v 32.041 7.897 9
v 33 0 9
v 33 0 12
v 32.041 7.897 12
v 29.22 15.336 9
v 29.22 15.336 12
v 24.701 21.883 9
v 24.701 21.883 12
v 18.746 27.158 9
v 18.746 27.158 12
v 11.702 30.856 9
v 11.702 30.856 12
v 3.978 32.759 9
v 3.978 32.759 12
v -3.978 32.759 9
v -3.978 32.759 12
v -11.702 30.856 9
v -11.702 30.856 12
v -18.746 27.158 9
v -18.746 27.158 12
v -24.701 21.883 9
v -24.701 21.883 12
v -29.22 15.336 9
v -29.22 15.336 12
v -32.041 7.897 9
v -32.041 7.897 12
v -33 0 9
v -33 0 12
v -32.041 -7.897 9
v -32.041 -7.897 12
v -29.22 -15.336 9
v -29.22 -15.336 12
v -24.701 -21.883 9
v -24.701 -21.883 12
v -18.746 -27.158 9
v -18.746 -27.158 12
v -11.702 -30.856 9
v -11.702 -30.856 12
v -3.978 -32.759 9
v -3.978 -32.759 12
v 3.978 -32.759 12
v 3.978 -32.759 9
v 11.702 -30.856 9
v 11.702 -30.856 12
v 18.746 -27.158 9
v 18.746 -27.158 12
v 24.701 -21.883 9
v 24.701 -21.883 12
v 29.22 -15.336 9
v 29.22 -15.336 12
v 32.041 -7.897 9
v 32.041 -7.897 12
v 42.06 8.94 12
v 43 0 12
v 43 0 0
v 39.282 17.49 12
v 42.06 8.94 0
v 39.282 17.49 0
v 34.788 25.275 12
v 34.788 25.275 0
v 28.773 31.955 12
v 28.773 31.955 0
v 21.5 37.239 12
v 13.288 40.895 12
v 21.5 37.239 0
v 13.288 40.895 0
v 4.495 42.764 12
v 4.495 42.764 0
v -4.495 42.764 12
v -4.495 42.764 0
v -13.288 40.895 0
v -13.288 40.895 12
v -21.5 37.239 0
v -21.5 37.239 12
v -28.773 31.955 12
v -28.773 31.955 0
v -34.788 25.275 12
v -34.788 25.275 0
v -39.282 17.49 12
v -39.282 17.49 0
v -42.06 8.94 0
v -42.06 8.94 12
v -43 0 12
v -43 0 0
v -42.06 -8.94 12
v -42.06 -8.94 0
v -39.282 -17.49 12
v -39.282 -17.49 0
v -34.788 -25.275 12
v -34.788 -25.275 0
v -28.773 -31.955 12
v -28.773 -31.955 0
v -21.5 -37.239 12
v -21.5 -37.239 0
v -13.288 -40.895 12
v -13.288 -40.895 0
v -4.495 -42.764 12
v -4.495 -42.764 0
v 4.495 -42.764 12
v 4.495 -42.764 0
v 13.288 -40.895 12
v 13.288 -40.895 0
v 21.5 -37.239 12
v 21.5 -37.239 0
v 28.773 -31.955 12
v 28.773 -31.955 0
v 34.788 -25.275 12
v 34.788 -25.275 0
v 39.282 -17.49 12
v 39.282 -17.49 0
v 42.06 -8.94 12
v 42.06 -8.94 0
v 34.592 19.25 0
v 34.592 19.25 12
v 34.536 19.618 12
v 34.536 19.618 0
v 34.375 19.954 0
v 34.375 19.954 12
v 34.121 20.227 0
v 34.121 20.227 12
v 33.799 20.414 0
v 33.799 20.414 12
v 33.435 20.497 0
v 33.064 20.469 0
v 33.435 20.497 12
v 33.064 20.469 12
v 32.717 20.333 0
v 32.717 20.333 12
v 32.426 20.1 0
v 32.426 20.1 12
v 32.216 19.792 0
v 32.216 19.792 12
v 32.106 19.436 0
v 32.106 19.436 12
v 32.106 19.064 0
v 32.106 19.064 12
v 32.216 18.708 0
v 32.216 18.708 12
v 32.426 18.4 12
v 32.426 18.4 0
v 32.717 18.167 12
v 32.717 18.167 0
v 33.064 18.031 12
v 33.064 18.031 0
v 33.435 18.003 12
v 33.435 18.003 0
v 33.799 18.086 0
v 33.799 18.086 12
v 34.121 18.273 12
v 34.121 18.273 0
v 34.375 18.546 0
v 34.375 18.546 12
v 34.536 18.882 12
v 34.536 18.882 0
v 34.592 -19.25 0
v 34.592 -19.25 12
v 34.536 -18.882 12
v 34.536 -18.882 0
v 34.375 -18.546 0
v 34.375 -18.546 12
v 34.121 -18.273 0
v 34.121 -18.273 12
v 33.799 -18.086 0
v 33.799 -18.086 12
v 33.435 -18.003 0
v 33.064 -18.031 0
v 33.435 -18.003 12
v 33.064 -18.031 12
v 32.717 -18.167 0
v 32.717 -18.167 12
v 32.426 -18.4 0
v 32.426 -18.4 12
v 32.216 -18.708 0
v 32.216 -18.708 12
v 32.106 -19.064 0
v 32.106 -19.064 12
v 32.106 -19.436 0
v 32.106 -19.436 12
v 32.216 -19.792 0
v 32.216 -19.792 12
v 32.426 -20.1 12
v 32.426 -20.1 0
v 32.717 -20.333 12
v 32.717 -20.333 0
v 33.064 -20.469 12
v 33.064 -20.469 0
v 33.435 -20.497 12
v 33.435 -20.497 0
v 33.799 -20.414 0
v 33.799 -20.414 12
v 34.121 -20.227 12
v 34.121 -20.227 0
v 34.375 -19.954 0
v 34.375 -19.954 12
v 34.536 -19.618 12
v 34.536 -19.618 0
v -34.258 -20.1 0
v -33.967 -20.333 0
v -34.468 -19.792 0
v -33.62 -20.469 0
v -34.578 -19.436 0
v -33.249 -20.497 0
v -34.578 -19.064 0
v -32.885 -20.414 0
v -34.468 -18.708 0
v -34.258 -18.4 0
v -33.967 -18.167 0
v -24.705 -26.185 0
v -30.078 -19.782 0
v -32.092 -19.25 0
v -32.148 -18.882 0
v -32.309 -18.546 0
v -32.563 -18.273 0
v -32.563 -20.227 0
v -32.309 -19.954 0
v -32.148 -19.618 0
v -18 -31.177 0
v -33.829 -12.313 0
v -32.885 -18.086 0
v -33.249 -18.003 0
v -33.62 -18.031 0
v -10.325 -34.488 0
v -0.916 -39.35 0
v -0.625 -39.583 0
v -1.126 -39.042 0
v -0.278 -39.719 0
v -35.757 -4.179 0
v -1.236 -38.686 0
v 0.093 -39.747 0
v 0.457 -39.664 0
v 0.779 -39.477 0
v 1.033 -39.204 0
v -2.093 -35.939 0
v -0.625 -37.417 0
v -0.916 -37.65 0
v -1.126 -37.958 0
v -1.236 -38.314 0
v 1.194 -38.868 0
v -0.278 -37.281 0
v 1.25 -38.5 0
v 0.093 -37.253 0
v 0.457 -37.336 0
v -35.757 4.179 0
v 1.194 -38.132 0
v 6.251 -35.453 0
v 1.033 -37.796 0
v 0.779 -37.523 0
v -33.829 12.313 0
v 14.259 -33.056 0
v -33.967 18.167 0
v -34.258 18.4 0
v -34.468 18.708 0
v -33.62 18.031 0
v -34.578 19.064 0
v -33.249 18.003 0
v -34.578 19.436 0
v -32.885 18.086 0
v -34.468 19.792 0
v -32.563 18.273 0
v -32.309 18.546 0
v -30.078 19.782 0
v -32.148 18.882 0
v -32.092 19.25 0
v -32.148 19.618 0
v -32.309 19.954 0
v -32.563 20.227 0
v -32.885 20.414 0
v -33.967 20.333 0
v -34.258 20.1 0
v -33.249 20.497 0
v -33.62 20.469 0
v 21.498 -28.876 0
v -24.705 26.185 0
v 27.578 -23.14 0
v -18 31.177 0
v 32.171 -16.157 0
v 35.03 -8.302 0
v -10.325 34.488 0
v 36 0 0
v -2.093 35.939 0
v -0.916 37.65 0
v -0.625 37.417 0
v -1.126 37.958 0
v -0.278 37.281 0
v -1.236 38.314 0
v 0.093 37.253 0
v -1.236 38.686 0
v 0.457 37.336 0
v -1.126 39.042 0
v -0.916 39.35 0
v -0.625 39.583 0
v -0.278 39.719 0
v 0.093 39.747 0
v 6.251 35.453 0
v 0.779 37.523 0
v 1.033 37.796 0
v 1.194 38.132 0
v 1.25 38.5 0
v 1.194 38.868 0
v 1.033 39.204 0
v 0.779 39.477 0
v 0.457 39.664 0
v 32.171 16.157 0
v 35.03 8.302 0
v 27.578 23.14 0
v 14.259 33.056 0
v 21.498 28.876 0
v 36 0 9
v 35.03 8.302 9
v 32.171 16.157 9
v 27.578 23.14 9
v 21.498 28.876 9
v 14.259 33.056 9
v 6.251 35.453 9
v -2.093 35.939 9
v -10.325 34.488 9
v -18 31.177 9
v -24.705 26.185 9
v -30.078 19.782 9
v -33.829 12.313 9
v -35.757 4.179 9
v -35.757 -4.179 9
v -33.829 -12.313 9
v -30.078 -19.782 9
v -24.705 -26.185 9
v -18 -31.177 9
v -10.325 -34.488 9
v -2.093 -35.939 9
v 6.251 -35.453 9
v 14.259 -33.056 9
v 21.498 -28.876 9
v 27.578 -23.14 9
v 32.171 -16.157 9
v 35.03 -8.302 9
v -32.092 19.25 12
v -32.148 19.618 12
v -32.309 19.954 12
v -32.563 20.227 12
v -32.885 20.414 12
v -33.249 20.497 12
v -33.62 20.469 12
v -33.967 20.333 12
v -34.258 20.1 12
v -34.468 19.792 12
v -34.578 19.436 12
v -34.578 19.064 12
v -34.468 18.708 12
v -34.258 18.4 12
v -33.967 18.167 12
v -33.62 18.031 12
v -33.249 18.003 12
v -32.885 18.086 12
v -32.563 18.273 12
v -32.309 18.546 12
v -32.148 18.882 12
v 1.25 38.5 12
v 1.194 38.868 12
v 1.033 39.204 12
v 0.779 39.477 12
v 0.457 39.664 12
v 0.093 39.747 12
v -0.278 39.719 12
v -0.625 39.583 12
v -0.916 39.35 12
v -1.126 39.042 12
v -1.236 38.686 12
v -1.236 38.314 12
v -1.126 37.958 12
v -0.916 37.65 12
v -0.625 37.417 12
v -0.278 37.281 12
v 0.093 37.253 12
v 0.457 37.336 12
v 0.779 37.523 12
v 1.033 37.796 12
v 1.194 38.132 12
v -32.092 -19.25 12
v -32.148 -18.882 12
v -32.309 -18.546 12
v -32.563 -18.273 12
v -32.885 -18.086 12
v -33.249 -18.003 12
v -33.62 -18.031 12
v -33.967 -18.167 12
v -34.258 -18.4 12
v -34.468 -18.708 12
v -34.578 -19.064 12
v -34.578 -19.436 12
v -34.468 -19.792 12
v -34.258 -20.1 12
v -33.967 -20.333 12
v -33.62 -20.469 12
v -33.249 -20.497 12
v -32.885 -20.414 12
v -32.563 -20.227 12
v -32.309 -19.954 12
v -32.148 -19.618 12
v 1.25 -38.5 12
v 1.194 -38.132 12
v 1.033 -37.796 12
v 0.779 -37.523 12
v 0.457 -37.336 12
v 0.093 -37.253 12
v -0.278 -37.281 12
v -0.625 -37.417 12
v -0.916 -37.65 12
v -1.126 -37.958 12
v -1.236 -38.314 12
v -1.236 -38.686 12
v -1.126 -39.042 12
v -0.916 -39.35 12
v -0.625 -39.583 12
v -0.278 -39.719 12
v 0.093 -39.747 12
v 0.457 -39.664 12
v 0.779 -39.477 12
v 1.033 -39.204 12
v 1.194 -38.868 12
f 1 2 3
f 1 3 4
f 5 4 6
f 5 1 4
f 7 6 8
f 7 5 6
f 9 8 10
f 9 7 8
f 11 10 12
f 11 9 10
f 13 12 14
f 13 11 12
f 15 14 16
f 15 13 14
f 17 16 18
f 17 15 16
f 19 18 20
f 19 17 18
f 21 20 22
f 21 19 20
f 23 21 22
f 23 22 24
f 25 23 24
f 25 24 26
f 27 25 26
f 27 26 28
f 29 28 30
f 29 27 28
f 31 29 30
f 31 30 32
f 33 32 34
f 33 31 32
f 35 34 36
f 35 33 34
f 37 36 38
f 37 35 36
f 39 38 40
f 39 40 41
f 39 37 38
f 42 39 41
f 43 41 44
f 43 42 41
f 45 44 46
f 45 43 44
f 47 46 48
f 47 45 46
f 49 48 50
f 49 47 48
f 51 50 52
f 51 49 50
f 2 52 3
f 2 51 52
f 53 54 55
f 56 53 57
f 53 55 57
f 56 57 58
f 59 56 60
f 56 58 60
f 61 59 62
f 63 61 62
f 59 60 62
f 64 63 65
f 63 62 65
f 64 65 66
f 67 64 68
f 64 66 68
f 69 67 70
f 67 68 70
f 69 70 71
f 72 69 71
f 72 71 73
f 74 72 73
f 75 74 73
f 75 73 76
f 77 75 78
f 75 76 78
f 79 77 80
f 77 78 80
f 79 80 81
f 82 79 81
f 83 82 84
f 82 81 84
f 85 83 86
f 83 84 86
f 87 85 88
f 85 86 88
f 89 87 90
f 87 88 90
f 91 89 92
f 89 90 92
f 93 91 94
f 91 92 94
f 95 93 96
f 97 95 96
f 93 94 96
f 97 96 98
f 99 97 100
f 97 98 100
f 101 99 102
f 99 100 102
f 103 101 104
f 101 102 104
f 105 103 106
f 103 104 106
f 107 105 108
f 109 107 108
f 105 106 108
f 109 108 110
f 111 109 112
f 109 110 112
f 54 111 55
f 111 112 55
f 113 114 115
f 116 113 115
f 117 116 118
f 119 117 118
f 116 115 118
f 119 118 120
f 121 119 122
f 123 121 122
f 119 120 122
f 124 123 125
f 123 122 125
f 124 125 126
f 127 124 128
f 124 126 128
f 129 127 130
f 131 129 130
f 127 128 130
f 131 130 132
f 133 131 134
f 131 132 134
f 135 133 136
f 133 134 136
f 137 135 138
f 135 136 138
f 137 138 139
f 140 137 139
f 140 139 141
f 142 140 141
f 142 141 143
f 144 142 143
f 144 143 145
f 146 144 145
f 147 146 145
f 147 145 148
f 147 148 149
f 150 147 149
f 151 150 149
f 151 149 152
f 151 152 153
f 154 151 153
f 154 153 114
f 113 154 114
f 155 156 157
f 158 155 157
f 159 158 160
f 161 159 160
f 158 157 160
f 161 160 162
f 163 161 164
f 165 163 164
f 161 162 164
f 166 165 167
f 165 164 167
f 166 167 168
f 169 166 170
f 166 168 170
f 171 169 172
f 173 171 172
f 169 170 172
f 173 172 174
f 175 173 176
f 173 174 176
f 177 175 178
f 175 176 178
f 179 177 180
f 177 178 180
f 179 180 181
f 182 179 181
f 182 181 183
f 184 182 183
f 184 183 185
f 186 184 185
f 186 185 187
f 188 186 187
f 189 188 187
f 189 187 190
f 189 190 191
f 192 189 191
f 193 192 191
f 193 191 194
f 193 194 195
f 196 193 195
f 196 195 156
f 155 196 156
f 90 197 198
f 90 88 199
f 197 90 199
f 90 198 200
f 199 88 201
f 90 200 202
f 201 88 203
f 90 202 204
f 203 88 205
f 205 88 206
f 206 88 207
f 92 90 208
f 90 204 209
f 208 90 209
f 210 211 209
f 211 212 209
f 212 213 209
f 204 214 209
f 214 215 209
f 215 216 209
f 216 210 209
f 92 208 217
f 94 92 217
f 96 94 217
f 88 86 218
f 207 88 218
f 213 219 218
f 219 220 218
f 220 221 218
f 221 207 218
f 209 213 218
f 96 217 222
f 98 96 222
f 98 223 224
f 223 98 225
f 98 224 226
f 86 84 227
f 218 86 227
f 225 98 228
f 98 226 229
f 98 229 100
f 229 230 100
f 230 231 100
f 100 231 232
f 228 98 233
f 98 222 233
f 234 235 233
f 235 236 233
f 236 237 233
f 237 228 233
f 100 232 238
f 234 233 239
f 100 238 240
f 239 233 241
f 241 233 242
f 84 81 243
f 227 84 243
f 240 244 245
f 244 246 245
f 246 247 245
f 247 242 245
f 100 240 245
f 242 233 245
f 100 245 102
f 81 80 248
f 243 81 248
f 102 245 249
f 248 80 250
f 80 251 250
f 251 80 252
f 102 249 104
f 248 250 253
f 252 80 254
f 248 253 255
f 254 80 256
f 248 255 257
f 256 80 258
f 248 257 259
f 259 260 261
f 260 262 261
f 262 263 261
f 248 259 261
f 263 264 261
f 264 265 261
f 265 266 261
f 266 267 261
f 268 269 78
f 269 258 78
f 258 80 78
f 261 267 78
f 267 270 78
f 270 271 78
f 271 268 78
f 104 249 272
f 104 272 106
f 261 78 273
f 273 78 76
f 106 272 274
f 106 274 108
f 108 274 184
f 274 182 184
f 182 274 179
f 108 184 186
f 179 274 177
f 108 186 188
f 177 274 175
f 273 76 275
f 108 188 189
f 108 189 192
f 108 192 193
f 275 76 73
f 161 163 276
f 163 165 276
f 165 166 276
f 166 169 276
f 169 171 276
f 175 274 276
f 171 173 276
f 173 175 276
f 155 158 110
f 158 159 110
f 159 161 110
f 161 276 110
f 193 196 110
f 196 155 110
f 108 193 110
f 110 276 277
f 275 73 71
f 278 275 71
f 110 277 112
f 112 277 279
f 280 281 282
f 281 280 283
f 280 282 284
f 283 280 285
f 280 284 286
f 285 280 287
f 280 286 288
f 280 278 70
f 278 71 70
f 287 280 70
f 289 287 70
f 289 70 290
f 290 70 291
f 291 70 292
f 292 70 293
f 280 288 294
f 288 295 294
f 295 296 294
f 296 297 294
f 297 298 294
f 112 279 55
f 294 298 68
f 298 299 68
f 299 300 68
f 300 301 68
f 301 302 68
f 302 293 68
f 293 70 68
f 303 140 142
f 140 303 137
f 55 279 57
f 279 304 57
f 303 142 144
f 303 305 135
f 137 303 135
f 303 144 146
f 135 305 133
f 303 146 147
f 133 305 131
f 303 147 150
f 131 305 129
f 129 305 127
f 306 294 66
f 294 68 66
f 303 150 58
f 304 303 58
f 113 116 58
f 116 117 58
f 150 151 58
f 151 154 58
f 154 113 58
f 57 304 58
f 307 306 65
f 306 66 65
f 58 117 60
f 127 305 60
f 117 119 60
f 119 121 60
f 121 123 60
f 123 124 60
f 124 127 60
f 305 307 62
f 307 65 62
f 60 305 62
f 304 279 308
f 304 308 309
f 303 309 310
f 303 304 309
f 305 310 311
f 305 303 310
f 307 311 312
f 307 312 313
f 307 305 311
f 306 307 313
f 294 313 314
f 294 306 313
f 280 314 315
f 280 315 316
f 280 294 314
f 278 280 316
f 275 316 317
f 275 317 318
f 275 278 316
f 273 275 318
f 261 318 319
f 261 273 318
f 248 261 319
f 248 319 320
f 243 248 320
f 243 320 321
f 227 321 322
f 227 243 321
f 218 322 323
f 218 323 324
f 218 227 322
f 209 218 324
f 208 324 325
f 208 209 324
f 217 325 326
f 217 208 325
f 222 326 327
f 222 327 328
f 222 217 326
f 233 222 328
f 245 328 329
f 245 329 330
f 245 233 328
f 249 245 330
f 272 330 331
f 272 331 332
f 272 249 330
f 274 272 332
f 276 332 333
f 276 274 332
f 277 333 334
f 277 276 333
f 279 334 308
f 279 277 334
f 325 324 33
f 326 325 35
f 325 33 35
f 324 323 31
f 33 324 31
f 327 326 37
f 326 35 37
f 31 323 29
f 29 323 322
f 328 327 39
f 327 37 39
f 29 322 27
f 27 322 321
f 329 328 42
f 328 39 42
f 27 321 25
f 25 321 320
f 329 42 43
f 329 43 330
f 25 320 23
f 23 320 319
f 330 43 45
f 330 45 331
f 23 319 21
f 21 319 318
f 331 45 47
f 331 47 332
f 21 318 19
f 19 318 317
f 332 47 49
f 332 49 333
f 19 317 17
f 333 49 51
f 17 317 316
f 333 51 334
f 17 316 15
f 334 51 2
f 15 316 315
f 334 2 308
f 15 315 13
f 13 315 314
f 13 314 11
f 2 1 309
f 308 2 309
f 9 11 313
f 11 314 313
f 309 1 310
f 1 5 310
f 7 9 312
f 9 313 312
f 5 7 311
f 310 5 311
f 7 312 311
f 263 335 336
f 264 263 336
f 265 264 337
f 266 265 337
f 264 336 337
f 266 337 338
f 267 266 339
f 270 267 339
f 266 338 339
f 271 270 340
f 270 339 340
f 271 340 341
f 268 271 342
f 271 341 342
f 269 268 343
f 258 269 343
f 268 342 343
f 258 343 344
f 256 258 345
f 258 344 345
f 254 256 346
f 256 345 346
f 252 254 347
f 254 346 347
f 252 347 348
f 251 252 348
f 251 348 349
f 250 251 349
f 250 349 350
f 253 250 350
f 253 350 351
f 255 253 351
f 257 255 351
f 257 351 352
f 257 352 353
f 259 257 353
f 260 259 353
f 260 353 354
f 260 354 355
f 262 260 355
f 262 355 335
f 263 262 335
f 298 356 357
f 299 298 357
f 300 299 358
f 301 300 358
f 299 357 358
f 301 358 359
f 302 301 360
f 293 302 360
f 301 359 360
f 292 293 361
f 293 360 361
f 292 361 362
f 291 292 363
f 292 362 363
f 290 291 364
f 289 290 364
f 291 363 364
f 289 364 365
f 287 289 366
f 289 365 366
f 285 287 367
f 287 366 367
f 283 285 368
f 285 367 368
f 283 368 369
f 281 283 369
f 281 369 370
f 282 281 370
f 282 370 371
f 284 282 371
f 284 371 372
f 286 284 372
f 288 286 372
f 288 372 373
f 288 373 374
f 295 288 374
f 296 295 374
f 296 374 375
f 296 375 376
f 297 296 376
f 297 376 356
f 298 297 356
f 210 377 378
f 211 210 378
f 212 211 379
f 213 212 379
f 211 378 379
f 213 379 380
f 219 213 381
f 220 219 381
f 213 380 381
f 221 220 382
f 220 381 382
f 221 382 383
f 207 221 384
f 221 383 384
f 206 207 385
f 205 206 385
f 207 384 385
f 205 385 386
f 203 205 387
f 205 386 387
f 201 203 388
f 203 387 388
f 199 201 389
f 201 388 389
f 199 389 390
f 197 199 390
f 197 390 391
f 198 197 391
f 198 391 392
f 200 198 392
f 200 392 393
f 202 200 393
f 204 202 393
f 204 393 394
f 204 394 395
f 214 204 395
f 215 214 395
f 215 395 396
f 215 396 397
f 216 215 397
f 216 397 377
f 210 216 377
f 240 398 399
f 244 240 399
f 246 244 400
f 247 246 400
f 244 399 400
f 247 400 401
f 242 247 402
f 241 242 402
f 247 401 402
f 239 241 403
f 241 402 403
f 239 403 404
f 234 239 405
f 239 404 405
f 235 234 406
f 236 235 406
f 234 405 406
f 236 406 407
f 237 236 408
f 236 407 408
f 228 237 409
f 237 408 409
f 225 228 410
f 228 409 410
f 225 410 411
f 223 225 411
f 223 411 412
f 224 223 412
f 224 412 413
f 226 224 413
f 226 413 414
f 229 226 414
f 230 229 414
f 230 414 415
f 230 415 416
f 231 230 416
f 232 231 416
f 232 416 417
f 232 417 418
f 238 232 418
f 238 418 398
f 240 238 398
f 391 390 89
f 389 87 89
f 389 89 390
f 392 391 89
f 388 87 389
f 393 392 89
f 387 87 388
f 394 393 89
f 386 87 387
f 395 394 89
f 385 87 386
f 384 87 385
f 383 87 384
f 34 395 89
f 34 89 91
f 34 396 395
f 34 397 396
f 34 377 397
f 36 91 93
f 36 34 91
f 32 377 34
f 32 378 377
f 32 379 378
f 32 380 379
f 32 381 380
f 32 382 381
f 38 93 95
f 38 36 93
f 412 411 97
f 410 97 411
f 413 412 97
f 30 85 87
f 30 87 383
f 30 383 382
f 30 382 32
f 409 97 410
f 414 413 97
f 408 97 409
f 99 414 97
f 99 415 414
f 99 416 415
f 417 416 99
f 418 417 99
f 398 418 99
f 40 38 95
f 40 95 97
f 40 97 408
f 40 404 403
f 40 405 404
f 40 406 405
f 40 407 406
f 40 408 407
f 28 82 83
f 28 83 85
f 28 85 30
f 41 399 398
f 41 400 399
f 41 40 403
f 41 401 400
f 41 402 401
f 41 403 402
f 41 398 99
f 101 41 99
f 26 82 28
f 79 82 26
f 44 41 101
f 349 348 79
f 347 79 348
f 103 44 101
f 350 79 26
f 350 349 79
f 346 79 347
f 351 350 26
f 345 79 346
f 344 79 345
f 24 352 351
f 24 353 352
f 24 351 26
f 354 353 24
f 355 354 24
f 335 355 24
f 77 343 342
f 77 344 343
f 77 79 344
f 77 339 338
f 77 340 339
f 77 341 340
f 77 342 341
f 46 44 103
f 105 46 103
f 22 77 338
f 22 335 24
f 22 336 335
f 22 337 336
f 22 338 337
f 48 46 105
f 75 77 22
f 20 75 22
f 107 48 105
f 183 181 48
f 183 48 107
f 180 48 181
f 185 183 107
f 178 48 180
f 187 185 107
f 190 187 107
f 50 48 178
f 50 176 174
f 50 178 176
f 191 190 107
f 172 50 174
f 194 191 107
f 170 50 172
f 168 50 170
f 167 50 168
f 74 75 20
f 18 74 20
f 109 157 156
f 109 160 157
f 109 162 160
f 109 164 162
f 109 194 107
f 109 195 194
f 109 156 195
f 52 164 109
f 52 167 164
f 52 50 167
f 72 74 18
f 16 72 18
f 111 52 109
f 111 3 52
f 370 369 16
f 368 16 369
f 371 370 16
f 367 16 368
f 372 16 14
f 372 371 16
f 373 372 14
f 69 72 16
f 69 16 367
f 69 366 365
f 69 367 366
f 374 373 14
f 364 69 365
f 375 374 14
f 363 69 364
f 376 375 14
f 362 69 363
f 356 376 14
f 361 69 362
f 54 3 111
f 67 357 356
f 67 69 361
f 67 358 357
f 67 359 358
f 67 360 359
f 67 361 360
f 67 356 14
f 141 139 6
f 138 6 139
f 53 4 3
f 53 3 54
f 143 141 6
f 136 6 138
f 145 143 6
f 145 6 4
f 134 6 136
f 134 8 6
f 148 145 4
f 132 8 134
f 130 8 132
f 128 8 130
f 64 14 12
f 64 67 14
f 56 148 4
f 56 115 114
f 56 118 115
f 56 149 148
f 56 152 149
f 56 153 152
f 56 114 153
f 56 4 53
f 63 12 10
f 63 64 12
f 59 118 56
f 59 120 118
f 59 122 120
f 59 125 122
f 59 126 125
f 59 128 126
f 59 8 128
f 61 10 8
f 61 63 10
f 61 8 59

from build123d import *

# Parameters (mm, degrees)
SKETCH_1_R         = 43
SKETCH_1_R_2       = 36
EXTRUDE_1_DEPTH    = 9
SKETCH_2_R         = 43
SKETCH_2_R_2       = 33
EXTRUDE_2_DEPTH    = 3
HOLE_WIZARD_M3_1_D = 2.5


with BuildPart() as part:
    # 草图1 → 凸台-拉伸1 (new body)
    with BuildSketch(Plane.XY):
        Circle(SKETCH_1_R)
        Circle(SKETCH_1_R_2, mode=Mode.SUBTRACT)
    extrude(amount=EXTRUDE_1_DEPTH)

    # 草图2 → 凸台-拉伸2 (add)
    with BuildSketch(Plane.XY.offset(9)):
        Circle(SKETCH_2_R)
        Circle(SKETCH_2_R_2, mode=Mode.SUBTRACT)
    extrude(amount=EXTRUDE_2_DEPTH)

    # M3 螺纹孔1 (through all)
    with Locations(Plane(origin=(-33.341978046, 19.25, 0), x_dir=(-1, 0, 0), z_dir=(0, 0, -1))):
        with Locations((0, 0), (-33.341978046, 19.25), (-66.683956092, 0), (-66.683956092, -38.5), (-33.341978046, -57.75), (0, -38.5)):
            Hole(HOLE_WIZARD_M3_1_D / 2)


solid = part.part
